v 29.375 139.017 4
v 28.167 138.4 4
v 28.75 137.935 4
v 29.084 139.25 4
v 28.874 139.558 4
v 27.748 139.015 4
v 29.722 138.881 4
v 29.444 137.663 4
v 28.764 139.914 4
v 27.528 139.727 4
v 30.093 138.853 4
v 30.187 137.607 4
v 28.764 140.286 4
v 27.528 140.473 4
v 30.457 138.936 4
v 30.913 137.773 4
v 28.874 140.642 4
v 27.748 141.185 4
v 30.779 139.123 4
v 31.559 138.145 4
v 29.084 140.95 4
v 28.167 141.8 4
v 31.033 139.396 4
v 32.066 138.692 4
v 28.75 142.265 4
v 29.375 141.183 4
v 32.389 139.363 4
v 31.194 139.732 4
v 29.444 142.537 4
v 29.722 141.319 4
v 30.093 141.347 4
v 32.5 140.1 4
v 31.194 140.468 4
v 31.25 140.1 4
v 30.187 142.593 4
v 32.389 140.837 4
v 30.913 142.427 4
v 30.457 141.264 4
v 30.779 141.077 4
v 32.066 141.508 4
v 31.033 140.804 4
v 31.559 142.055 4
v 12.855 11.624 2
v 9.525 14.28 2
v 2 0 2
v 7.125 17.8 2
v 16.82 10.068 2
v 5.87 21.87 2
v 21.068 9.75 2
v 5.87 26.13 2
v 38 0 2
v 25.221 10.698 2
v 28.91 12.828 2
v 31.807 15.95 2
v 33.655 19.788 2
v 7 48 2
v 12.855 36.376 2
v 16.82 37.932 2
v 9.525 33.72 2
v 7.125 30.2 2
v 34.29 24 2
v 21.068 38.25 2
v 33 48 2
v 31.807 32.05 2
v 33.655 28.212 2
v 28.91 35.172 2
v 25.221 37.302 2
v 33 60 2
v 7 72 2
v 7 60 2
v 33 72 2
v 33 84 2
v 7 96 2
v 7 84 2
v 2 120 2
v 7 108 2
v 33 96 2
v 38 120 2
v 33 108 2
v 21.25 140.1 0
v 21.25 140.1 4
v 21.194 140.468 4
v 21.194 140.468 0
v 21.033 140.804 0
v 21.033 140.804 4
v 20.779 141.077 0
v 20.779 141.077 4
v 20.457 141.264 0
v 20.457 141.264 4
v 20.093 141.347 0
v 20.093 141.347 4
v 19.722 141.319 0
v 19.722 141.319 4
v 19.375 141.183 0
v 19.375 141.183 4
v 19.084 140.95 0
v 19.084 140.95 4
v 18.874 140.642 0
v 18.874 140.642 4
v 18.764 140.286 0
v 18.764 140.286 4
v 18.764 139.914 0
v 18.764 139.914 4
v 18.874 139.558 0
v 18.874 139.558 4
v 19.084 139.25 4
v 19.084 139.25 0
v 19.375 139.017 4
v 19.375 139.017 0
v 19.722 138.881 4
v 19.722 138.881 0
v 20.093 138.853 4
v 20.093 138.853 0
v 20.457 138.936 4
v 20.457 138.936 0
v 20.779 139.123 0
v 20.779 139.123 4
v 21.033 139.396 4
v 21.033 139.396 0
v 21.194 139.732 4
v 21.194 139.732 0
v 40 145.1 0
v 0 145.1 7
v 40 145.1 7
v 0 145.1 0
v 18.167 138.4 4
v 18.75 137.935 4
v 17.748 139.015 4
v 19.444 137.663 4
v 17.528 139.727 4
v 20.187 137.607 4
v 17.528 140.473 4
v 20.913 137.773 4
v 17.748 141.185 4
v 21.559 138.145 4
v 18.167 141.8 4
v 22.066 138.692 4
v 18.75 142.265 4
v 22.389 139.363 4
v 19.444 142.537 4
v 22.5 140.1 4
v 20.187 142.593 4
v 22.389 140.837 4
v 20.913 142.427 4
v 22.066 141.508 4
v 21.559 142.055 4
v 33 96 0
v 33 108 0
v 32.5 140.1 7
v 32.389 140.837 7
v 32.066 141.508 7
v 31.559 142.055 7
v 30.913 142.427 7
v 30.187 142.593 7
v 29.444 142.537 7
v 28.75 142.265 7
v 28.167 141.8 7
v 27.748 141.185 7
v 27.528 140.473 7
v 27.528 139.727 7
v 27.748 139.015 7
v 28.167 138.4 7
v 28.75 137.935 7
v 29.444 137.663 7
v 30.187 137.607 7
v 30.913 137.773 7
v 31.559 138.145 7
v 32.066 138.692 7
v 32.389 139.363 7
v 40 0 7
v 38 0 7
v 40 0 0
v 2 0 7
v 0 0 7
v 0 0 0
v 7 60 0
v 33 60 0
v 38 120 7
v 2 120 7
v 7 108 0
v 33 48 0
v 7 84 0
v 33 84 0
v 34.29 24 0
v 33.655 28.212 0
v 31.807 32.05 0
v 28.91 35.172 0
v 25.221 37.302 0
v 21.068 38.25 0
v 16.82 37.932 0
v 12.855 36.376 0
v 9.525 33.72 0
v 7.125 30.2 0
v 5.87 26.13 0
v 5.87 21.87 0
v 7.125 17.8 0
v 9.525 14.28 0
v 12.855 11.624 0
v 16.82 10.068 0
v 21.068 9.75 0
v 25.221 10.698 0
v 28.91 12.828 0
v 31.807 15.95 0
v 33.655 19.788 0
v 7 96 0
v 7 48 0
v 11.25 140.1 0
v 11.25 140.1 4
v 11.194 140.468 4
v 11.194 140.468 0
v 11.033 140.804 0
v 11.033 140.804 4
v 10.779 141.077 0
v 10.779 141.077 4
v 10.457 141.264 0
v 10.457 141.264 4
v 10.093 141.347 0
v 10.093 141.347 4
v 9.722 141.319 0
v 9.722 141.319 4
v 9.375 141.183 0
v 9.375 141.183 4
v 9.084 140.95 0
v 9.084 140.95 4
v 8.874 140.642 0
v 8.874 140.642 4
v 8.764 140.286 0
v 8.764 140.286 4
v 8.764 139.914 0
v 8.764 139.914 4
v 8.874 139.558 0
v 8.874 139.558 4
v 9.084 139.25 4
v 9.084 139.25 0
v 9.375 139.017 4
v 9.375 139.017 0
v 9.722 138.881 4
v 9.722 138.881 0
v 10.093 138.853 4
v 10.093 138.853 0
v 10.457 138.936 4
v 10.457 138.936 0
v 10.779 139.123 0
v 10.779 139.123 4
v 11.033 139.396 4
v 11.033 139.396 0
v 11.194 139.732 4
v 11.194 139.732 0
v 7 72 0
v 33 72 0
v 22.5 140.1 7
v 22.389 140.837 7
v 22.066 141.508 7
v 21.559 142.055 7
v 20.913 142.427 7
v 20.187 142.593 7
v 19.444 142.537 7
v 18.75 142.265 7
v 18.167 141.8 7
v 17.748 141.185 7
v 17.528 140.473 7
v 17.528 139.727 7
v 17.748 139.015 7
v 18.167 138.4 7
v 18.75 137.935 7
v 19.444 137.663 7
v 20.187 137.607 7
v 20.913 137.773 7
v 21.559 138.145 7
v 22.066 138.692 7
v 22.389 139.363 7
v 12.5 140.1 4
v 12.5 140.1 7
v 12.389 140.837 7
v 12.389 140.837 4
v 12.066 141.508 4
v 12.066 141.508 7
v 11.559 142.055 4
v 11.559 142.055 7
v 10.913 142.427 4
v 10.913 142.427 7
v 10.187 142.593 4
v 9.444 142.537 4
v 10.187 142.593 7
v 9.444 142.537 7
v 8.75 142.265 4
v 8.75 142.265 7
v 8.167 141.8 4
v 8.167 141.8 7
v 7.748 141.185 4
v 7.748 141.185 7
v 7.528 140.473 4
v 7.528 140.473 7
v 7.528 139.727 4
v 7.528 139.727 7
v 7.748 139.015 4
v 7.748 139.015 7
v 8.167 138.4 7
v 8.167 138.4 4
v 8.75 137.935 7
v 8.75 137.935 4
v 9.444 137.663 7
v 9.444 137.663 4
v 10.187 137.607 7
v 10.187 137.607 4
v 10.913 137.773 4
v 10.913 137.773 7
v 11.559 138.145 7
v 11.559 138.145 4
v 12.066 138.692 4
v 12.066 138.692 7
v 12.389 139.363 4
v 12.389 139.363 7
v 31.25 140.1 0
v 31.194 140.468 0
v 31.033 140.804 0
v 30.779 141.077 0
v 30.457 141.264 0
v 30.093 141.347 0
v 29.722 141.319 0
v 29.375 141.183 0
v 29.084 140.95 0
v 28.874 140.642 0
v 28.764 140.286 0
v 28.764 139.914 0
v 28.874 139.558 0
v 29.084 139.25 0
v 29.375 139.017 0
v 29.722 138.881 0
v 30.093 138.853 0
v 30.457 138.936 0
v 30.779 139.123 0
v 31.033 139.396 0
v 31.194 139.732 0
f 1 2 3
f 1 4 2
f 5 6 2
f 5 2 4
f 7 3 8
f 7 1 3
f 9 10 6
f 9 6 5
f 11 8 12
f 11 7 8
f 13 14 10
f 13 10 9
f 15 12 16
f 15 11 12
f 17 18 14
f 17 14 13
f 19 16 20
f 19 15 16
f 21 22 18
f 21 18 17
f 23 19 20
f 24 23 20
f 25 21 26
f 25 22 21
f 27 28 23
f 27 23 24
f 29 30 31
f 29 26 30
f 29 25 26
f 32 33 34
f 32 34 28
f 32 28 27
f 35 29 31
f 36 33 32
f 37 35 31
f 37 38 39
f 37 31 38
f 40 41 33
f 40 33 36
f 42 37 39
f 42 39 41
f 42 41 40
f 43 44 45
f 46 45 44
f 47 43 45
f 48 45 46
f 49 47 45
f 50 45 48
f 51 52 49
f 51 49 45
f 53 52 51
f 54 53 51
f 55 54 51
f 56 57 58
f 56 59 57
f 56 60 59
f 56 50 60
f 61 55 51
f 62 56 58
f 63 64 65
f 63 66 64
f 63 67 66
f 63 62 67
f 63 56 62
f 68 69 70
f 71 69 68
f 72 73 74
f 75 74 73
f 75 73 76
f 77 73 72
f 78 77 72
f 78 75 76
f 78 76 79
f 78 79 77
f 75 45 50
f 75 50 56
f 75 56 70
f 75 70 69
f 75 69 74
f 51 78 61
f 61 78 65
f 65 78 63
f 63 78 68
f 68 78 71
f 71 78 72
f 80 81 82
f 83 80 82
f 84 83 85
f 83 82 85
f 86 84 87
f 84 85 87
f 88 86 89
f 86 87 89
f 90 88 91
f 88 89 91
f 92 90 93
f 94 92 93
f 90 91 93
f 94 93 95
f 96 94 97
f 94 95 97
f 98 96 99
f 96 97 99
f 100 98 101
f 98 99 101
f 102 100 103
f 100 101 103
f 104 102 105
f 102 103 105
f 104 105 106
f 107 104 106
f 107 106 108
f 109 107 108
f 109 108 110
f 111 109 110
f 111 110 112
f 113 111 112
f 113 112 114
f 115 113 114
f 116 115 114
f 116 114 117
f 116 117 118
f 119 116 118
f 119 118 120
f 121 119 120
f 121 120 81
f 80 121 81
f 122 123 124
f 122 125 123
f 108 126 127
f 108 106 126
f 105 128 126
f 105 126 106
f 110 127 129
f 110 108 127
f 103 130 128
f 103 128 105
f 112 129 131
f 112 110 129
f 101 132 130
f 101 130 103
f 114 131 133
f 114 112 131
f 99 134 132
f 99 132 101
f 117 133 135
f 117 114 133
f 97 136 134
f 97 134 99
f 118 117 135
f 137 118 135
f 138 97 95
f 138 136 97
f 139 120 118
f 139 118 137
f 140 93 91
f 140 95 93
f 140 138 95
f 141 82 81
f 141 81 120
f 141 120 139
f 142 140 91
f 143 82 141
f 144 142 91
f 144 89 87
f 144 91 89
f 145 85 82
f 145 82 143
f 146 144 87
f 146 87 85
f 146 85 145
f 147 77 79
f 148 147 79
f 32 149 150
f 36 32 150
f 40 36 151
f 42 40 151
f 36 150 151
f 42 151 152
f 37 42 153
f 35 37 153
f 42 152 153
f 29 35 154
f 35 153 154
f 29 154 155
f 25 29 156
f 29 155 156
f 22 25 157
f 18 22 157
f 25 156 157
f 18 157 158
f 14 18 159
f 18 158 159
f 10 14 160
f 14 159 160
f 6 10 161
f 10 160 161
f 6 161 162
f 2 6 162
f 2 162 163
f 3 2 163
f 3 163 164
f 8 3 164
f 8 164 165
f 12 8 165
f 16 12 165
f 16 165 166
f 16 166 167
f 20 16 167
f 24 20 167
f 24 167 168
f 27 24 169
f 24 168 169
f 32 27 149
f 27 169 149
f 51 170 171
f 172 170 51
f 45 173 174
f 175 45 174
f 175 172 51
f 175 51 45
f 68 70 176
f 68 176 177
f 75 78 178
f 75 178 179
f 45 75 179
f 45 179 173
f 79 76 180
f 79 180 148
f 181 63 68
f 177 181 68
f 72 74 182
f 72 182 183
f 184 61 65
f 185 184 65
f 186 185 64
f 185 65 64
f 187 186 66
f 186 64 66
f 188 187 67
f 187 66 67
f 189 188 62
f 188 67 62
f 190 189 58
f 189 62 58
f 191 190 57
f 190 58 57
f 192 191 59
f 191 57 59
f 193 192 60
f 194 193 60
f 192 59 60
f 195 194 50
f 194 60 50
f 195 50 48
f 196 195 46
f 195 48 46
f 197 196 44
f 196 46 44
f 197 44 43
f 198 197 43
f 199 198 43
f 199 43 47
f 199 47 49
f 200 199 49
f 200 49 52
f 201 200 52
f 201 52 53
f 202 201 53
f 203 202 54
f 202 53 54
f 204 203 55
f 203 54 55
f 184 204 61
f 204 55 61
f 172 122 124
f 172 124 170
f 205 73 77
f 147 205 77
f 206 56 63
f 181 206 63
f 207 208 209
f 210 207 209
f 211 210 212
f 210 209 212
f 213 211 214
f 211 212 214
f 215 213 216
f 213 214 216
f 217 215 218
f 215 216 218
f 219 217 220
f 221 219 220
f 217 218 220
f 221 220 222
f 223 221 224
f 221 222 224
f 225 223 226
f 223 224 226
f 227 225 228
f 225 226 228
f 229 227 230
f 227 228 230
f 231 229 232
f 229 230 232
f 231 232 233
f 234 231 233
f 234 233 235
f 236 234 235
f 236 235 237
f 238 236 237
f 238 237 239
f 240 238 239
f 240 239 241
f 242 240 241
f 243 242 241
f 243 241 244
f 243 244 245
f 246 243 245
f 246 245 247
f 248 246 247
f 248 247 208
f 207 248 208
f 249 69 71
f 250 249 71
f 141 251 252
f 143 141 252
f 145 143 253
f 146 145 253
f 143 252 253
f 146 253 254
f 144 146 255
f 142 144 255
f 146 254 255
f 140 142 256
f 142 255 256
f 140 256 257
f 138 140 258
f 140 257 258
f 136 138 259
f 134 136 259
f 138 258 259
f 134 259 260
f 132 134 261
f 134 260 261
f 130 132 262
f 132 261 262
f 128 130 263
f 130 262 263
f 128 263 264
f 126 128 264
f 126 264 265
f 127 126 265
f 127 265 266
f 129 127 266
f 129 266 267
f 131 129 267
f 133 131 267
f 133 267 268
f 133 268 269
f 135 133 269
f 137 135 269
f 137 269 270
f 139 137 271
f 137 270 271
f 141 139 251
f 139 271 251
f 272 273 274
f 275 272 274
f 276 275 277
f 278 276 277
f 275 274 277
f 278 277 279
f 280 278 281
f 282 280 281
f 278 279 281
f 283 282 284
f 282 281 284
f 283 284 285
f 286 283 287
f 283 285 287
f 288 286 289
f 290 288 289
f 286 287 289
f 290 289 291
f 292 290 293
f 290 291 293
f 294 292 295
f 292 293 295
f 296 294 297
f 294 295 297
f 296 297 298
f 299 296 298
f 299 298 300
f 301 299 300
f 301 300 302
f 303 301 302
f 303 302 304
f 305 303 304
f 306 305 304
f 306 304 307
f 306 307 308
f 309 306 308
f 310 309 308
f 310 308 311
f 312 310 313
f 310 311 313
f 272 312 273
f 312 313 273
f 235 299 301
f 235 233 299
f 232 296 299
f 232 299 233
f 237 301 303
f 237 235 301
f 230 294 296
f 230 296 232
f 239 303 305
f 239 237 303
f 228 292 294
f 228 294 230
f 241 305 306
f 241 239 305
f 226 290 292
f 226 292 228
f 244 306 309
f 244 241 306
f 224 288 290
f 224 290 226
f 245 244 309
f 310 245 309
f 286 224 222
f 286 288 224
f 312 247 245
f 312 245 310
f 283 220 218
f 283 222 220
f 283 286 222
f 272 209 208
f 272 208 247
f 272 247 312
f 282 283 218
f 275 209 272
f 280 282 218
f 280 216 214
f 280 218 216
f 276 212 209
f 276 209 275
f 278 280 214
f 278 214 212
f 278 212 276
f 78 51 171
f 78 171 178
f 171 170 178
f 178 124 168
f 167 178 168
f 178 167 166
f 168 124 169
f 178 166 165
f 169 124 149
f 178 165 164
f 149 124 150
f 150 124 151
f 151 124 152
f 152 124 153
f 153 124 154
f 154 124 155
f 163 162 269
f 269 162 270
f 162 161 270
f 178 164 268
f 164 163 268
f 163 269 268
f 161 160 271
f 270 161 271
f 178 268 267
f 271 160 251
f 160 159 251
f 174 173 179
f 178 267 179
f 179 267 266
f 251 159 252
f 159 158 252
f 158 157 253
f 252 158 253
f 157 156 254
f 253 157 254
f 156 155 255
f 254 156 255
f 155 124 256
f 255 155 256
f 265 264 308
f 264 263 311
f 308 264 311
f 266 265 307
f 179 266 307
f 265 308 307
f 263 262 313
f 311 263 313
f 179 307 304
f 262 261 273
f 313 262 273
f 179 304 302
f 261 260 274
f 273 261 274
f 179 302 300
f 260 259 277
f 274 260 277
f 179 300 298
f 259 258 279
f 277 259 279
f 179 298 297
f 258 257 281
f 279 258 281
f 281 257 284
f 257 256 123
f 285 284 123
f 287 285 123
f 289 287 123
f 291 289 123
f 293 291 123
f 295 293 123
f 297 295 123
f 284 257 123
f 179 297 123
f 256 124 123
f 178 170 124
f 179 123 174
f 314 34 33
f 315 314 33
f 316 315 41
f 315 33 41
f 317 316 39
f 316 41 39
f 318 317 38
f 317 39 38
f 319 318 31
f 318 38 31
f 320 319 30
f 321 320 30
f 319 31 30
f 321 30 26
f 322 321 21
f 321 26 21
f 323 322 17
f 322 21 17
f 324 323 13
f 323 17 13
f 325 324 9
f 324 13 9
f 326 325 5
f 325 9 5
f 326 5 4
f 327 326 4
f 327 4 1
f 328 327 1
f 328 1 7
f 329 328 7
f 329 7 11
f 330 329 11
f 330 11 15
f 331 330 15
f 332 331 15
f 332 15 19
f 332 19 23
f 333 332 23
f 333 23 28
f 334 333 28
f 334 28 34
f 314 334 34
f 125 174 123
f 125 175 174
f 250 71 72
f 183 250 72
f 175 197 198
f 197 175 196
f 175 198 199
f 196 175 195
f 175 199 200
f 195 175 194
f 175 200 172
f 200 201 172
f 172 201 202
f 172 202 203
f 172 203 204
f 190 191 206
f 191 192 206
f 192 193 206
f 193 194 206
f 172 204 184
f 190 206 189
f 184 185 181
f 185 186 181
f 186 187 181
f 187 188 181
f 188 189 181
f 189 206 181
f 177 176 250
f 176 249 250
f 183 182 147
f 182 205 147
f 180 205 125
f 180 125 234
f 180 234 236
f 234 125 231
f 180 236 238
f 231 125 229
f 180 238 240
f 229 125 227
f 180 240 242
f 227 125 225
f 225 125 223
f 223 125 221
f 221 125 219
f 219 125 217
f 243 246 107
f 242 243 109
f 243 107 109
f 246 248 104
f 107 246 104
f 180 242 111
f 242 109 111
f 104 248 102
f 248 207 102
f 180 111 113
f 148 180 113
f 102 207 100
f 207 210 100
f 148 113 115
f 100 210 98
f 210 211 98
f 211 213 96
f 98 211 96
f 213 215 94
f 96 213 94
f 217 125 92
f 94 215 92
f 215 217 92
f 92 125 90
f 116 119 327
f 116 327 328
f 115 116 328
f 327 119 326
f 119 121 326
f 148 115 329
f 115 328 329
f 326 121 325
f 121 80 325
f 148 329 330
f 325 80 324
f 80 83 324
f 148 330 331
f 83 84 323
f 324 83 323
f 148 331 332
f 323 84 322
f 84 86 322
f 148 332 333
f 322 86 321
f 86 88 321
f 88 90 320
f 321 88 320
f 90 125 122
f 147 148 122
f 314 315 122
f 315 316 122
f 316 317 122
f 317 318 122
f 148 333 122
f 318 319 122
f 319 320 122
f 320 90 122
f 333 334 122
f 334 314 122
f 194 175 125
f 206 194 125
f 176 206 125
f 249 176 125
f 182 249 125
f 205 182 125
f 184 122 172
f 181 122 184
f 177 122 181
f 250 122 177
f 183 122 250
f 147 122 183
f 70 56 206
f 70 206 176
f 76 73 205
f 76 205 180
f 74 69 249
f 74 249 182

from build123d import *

# Parameters (mm, degrees)
SKETCH1_W           = 40
SKETCH1_H           = 145.1
BOSS_EXTRUDE1_DEPTH = 2
SKETCH2_R           = 14.29
CUT_EXTRUDE1_DEPTH  = 2
BOSS_EXTRUDE2_DEPTH = 5
SKETCH4_R           = 1.25
CUT_EXTRUDE2_DEPTH  = 7
SKETCH5_R           = 2.5
CUT_EXTRUDE3_DEPTH  = 3
SKETCH6_W           = 26
SKETCH6_H           = 12
CUT_EXTRUDE4_DEPTH  = 3


with BuildPart() as part:
    # Sketch1 → Boss-Extrude1 (new body)
    with BuildSketch(Plane.XY):
        with Locations((20, 72.55)):
            Rectangle(SKETCH1_W, SKETCH1_H)
    extrude(amount=BOSS_EXTRUDE1_DEPTH)

    # Sketch2 → Cut-Extrude1 (cut)
    with BuildSketch(Plane.XY.offset(2)):
        with Locations((20, 24)):
            Circle(SKETCH2_R)
    extrude(amount=-CUT_EXTRUDE1_DEPTH, mode=Mode.SUBTRACT)

    # Sketch3 → Boss-Extrude2 (add)
    with BuildSketch(Plane.XY.offset(2)):
        Polygon((0, 145.1), (40, 145.1), (40, 0), (38, 0), (38, 120), (2, 120), (2, 0), (0, 0), align=None)
    extrude(amount=BOSS_EXTRUDE2_DEPTH)

    # Sketch4 → Cut-Extrude2 (cut)
    with BuildSketch(Plane.XY.offset(7)):
        with Locations((20, 140.1)):
            Circle(SKETCH4_R)
        with Locations((10, 140.1)):
            Circle(SKETCH4_R)
        with Locations((30, 140.1)):
            Circle(SKETCH4_R)
    extrude(amount=-CUT_EXTRUDE2_DEPTH, mode=Mode.SUBTRACT)

    # Sketch5 → Cut-Extrude3 (cut)
    with BuildSketch(Plane.XY.offset(7)):
        with Locations((10, 140.1)):
            Circle(SKETCH5_R)
        with Locations((20, 140.1)):
            Circle(SKETCH5_R)
        with Locations((30, 140.1)):
            Circle(SKETCH5_R)
    extrude(amount=-CUT_EXTRUDE3_DEPTH, mode=Mode.SUBTRACT)

    # Sketch6 → Cut-Extrude4 (cut, through all)
    with BuildSketch(Plane.XY.offset(2)):
        with Locations((20, 102)):
            Rectangle(SKETCH6_W, SKETCH6_H)
        with Locations((20, 78)):
            Rectangle(SKETCH6_W, SKETCH6_H)
        with Locations((20, 54)):
            Rectangle(SKETCH6_W, SKETCH6_H)
    extrude(amount=-CUT_EXTRUDE4_DEPTH, mode=Mode.SUBTRACT)


solid = part.part
